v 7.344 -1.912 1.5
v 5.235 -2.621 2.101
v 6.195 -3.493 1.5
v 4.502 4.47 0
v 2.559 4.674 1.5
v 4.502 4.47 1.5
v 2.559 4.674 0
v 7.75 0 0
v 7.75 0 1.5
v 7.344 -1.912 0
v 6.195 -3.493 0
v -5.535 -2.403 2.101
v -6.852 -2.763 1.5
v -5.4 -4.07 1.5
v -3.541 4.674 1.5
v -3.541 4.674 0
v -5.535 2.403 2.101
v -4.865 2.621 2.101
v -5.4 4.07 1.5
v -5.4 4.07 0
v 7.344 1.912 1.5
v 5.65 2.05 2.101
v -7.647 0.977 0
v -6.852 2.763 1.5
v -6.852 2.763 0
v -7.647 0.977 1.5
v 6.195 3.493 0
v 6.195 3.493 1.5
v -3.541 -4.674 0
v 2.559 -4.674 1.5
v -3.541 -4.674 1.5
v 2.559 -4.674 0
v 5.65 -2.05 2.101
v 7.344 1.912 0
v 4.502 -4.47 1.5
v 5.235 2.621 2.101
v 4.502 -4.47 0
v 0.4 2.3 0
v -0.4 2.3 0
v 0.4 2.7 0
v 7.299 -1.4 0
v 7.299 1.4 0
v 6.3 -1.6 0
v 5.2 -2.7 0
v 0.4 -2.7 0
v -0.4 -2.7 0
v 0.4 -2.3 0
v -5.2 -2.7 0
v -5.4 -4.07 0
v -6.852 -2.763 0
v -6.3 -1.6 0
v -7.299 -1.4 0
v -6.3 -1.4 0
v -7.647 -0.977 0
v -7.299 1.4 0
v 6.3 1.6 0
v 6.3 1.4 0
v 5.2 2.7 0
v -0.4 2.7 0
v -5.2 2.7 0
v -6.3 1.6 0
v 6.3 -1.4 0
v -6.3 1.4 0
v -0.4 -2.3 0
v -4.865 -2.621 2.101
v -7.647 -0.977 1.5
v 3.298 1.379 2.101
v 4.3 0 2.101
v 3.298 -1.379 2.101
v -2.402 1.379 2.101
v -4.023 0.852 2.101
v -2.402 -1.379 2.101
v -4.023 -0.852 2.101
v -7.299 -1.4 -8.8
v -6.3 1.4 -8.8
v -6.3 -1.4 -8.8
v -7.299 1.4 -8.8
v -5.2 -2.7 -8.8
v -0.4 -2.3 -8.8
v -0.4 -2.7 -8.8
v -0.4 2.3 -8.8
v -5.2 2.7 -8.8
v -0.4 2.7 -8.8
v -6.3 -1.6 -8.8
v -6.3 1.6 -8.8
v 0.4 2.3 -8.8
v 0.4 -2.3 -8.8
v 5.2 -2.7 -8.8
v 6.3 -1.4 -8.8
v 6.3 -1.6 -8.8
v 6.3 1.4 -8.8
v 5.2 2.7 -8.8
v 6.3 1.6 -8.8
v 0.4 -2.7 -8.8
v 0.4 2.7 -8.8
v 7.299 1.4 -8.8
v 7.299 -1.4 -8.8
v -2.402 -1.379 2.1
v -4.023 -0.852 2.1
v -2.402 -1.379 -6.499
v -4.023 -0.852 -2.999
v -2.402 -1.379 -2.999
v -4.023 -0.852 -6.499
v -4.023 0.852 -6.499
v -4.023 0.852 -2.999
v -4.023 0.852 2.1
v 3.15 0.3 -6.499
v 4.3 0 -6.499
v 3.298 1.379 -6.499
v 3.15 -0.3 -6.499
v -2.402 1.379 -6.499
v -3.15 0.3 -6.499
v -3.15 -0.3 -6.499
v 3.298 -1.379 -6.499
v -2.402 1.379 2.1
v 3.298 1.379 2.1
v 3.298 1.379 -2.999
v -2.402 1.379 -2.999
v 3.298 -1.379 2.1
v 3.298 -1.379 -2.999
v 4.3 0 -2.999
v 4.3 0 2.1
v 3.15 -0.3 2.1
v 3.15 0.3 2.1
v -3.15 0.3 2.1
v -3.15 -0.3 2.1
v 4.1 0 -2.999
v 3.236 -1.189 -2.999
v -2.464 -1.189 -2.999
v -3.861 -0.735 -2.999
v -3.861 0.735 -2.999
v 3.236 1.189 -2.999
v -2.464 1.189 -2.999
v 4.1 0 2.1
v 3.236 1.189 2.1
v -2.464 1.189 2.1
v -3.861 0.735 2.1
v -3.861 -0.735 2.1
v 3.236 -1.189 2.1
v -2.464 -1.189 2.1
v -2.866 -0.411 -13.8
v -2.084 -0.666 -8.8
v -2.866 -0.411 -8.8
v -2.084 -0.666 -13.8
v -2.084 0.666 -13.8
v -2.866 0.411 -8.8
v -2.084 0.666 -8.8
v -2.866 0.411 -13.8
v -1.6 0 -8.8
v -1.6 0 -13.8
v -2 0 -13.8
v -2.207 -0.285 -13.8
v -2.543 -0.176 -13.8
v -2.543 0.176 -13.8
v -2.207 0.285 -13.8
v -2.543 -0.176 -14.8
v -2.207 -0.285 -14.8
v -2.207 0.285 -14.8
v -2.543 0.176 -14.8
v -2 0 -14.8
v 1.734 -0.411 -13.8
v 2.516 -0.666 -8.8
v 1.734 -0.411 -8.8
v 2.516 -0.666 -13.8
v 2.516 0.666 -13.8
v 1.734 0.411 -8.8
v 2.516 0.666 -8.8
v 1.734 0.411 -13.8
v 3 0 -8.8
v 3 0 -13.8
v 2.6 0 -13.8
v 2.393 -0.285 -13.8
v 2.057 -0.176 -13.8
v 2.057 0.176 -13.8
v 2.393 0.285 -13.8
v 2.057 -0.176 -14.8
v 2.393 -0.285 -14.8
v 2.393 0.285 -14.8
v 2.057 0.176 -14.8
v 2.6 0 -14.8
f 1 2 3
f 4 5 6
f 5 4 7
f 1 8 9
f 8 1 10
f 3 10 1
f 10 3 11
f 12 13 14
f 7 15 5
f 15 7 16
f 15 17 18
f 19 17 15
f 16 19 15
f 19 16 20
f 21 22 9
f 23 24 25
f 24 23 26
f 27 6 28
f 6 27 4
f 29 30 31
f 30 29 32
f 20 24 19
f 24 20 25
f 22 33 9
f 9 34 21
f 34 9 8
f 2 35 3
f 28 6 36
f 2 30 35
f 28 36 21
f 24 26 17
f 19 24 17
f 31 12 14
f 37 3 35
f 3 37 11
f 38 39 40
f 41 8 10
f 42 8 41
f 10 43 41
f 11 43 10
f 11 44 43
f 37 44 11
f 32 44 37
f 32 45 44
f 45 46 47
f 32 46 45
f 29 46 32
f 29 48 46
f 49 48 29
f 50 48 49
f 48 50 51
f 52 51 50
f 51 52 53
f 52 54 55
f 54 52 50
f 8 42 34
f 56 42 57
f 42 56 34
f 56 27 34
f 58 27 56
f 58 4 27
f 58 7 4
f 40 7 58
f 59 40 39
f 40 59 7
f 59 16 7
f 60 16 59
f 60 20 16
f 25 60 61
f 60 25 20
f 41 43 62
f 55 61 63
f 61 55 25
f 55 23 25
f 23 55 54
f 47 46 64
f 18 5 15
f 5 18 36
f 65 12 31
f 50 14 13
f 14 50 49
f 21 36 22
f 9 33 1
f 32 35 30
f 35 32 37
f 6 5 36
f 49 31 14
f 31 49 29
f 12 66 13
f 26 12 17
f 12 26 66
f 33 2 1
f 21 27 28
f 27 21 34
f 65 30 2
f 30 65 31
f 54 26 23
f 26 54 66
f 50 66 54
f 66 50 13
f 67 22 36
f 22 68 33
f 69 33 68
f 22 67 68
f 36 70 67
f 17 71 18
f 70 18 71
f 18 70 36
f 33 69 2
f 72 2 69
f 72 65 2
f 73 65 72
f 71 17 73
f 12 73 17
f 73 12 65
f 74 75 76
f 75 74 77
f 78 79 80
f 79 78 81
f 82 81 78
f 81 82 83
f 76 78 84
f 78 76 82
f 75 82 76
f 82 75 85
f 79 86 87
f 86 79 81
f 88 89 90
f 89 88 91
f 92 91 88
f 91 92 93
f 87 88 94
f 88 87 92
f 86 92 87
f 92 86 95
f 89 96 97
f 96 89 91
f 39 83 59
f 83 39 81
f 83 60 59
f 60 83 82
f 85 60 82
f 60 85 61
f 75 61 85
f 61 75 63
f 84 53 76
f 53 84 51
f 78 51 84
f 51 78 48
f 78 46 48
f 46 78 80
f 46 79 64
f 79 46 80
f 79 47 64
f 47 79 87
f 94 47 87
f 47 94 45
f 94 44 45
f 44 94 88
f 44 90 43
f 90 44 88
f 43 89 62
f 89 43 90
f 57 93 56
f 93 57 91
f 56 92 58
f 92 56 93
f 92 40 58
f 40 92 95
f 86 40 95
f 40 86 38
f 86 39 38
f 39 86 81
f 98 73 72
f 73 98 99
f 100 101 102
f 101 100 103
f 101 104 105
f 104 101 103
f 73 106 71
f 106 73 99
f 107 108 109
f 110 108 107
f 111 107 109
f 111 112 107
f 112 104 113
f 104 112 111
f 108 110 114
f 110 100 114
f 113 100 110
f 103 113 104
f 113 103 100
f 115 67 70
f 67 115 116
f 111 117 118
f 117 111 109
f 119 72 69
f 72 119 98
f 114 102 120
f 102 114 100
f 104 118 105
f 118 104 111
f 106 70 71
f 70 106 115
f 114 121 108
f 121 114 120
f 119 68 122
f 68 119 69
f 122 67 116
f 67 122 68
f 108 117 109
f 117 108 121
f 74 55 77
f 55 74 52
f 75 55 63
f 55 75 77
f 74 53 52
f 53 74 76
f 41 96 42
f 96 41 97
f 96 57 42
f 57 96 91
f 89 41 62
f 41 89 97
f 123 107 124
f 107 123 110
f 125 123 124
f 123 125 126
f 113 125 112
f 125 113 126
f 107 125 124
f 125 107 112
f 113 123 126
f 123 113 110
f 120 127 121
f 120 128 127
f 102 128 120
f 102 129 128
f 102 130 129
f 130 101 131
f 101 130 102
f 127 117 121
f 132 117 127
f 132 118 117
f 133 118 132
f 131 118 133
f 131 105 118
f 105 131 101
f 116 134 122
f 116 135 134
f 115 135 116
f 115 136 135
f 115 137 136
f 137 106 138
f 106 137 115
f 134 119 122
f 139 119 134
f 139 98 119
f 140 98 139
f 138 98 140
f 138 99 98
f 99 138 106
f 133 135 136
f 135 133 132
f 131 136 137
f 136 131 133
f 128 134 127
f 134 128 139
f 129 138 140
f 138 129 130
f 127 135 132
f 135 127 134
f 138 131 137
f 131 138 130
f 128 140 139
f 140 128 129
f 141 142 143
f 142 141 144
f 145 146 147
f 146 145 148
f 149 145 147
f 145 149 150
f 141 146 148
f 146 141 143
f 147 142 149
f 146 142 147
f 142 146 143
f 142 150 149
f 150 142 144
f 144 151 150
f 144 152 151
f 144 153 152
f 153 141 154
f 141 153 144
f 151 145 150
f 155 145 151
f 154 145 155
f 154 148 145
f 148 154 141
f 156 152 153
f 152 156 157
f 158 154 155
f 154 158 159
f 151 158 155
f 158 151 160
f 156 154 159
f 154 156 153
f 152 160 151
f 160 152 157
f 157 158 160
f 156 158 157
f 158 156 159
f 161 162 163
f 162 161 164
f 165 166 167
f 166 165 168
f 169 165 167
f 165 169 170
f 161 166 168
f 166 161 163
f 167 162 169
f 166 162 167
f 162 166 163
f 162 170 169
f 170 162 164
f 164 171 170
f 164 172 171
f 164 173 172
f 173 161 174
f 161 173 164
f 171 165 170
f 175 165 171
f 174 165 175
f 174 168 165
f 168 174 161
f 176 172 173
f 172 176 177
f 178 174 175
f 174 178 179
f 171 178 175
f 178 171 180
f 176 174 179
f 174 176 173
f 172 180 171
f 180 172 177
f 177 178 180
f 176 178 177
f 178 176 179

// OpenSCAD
Stick_Out_Edge_Depth = 1.5;
Stick_Out_Edge_Length = 15.5;
Stick_Out_Edge_Width = 9.4;

Stick_Out_End_Depth = 2.1;
Stick_Out_End_Length = 11.3;
Stick_Out_End_Width = 5.3;
Stick_Out_End_Edge_Radius = 1.2;

Hole_Length = 8.2;
Hole_Width = 2.5;
Hole_Depth = 5.1;

Metal_Thickness = 0.2;

Plastic_Hole_Length = Hole_Length + Metal_Thickness * 2;
Plastic_Hole_Width = Hole_Width + Metal_Thickness * 2;

Plate_Width = 6.3;
Plate_Thickness = 0.6;

Back_Length = 12.6;
Back_Width = 5.4;
Back_Depth = 8.8;
Back_Edge = 1.1;
Back_Cutout = 0.4;

Clamp_Height = 2.8;
Clamp_Width = 1;

Cable_Width = 1.4;
Cable_Offset = 2.3;
Cable_Length = 5;

Wire_Width = 0.6;
Wire_Length = 1;

Back_Polygon = [[-Back_Length / 2, -Back_Width / 2 + Back_Edge],
                [-Back_Length / 2 + Back_Edge, -Back_Width / 2],
                [-Back_Cutout, -Back_Width / 2],
                [-Back_Cutout, -Back_Width / 2 + Back_Cutout],
                [Back_Cutout, -Back_Width / 2 + Back_Cutout],
                [Back_Cutout, -Back_Width / 2],
                [Back_Length / 2 - Back_Edge, -Back_Width / 2],
                [Back_Length / 2, -Back_Width / 2 + Back_Edge],
                [Back_Length / 2, Back_Width / 2 - Back_Edge],
                [Back_Length / 2 - Back_Edge, Back_Width / 2],
                [-Back_Cutout, Back_Width / 2],
                [-Back_Cutout, Back_Width / 2 - Back_Cutout],
                [Back_Cutout, Back_Width / 2 - Back_Cutout],
                [Back_Cutout, Back_Width / 2],
                [-Back_Length / 2 + Back_Edge, Back_Width / 2],
                [-Back_Length / 2, Back_Width / 2 - Back_Edge]];

e = 0.001;

USB_C_Socket("#111", "#AAA");

module USB_C_Socket(color, metal_color, negative = false) {
    if (negative) {
        color(color)
            translate([0, 0, -Back_Depth])
                linear_extrude(Back_Depth, convexity = 2)
                    polygon(Back_Polygon);

        for (x = [-1, 1])
            translate([x * (Back_Length + Clamp_Width - e) / 2, 0, -Back_Depth / 2])
                cube([Clamp_Width, Clamp_Height, Back_Depth], center = true);
    } else {
        color(color) {
            difference() {
                union() {
                    hull() {
                        for (x = [-1, 1]) {
                            translate([x * (Stick_Out_Edge_Length - Stick_Out_Edge_Width) / 2, 0, 0]) {
                                cylinder(Stick_Out_Edge_Depth, d = Stick_Out_Edge_Width);
                            }
                            for (y = [-1, 1]) {
                                translate([x * (Stick_Out_End_Length - Stick_Out_End_Edge_Radius) / 2,
                                        y * (Stick_Out_End_Width - Stick_Out_End_Edge_Radius) / 2,
                                        Stick_Out_End_Depth]) {
                                    cylinder(e, d = Stick_Out_End_Edge_Radius);
                                }
                            }
                        }
                    }
                    translate([0, 0, -Back_Depth])
                        linear_extrude(Back_Depth, convexity = 2)
                            polygon(Back_Polygon);
                }
                hull() {
                    for (x = [-1, 1]) {
                        translate([x * (Plastic_Hole_Length - Plastic_Hole_Width) / 2, 0, Stick_Out_End_Depth - Plastic_Hole_Length + e / 2]) {
                            cylinder(Plastic_Hole_Length + e, d = Plastic_Hole_Width);
                        }
                    }
                }
            }

            translate([0, 0, Stick_Out_End_Depth - Plastic_Hole_Length / 2])
                cube([Plate_Width, Plate_Thickness, Plastic_Hole_Length], center = true);

            for (x = [-1, 1])
                translate([x * (Back_Length + Clamp_Width - e) / 2, 0, -Back_Depth / 2])
                    cube([Clamp_Width, Clamp_Height, Back_Depth], center = true);
        }

        color(metal_color)
            difference() {
                hull()
                    for (x = [-1, 1])
                        translate([x * (Plastic_Hole_Length - Plastic_Hole_Width) / 2, 0, Stick_Out_End_Depth - Hole_Depth + e / 2])
                            cylinder(Hole_Depth, d = Plastic_Hole_Width);
                translate([0, 0, e])
                    hull()
                        for (x = [-1, 1])
                            translate([x * (Hole_Length - Hole_Width) / 2, 0, Stick_Out_End_Depth - Hole_Depth - e])
                                cylinder(Hole_Depth + e * 2, d = Hole_Width);
            }

        for (cable = [[-1, "#F00"], [1, "#111"]]) {
            translate([cable[0] * Cable_Offset, 0, -Back_Depth - Cable_Length]) {
                color(cable[1])
                    cylinder(Cable_Length, d = Cable_Width);
                translate([0, 0, -Wire_Length])
                    color(metal_color)
                        cylinder(Wire_Length, d = Wire_Width);
            }
        }
    }
}

function USB_C_Socket_Dimensions() = [Stick_Out_Edge_Length, Stick_Out_Edge_Width, Stick_Out_Edge_Depth];
